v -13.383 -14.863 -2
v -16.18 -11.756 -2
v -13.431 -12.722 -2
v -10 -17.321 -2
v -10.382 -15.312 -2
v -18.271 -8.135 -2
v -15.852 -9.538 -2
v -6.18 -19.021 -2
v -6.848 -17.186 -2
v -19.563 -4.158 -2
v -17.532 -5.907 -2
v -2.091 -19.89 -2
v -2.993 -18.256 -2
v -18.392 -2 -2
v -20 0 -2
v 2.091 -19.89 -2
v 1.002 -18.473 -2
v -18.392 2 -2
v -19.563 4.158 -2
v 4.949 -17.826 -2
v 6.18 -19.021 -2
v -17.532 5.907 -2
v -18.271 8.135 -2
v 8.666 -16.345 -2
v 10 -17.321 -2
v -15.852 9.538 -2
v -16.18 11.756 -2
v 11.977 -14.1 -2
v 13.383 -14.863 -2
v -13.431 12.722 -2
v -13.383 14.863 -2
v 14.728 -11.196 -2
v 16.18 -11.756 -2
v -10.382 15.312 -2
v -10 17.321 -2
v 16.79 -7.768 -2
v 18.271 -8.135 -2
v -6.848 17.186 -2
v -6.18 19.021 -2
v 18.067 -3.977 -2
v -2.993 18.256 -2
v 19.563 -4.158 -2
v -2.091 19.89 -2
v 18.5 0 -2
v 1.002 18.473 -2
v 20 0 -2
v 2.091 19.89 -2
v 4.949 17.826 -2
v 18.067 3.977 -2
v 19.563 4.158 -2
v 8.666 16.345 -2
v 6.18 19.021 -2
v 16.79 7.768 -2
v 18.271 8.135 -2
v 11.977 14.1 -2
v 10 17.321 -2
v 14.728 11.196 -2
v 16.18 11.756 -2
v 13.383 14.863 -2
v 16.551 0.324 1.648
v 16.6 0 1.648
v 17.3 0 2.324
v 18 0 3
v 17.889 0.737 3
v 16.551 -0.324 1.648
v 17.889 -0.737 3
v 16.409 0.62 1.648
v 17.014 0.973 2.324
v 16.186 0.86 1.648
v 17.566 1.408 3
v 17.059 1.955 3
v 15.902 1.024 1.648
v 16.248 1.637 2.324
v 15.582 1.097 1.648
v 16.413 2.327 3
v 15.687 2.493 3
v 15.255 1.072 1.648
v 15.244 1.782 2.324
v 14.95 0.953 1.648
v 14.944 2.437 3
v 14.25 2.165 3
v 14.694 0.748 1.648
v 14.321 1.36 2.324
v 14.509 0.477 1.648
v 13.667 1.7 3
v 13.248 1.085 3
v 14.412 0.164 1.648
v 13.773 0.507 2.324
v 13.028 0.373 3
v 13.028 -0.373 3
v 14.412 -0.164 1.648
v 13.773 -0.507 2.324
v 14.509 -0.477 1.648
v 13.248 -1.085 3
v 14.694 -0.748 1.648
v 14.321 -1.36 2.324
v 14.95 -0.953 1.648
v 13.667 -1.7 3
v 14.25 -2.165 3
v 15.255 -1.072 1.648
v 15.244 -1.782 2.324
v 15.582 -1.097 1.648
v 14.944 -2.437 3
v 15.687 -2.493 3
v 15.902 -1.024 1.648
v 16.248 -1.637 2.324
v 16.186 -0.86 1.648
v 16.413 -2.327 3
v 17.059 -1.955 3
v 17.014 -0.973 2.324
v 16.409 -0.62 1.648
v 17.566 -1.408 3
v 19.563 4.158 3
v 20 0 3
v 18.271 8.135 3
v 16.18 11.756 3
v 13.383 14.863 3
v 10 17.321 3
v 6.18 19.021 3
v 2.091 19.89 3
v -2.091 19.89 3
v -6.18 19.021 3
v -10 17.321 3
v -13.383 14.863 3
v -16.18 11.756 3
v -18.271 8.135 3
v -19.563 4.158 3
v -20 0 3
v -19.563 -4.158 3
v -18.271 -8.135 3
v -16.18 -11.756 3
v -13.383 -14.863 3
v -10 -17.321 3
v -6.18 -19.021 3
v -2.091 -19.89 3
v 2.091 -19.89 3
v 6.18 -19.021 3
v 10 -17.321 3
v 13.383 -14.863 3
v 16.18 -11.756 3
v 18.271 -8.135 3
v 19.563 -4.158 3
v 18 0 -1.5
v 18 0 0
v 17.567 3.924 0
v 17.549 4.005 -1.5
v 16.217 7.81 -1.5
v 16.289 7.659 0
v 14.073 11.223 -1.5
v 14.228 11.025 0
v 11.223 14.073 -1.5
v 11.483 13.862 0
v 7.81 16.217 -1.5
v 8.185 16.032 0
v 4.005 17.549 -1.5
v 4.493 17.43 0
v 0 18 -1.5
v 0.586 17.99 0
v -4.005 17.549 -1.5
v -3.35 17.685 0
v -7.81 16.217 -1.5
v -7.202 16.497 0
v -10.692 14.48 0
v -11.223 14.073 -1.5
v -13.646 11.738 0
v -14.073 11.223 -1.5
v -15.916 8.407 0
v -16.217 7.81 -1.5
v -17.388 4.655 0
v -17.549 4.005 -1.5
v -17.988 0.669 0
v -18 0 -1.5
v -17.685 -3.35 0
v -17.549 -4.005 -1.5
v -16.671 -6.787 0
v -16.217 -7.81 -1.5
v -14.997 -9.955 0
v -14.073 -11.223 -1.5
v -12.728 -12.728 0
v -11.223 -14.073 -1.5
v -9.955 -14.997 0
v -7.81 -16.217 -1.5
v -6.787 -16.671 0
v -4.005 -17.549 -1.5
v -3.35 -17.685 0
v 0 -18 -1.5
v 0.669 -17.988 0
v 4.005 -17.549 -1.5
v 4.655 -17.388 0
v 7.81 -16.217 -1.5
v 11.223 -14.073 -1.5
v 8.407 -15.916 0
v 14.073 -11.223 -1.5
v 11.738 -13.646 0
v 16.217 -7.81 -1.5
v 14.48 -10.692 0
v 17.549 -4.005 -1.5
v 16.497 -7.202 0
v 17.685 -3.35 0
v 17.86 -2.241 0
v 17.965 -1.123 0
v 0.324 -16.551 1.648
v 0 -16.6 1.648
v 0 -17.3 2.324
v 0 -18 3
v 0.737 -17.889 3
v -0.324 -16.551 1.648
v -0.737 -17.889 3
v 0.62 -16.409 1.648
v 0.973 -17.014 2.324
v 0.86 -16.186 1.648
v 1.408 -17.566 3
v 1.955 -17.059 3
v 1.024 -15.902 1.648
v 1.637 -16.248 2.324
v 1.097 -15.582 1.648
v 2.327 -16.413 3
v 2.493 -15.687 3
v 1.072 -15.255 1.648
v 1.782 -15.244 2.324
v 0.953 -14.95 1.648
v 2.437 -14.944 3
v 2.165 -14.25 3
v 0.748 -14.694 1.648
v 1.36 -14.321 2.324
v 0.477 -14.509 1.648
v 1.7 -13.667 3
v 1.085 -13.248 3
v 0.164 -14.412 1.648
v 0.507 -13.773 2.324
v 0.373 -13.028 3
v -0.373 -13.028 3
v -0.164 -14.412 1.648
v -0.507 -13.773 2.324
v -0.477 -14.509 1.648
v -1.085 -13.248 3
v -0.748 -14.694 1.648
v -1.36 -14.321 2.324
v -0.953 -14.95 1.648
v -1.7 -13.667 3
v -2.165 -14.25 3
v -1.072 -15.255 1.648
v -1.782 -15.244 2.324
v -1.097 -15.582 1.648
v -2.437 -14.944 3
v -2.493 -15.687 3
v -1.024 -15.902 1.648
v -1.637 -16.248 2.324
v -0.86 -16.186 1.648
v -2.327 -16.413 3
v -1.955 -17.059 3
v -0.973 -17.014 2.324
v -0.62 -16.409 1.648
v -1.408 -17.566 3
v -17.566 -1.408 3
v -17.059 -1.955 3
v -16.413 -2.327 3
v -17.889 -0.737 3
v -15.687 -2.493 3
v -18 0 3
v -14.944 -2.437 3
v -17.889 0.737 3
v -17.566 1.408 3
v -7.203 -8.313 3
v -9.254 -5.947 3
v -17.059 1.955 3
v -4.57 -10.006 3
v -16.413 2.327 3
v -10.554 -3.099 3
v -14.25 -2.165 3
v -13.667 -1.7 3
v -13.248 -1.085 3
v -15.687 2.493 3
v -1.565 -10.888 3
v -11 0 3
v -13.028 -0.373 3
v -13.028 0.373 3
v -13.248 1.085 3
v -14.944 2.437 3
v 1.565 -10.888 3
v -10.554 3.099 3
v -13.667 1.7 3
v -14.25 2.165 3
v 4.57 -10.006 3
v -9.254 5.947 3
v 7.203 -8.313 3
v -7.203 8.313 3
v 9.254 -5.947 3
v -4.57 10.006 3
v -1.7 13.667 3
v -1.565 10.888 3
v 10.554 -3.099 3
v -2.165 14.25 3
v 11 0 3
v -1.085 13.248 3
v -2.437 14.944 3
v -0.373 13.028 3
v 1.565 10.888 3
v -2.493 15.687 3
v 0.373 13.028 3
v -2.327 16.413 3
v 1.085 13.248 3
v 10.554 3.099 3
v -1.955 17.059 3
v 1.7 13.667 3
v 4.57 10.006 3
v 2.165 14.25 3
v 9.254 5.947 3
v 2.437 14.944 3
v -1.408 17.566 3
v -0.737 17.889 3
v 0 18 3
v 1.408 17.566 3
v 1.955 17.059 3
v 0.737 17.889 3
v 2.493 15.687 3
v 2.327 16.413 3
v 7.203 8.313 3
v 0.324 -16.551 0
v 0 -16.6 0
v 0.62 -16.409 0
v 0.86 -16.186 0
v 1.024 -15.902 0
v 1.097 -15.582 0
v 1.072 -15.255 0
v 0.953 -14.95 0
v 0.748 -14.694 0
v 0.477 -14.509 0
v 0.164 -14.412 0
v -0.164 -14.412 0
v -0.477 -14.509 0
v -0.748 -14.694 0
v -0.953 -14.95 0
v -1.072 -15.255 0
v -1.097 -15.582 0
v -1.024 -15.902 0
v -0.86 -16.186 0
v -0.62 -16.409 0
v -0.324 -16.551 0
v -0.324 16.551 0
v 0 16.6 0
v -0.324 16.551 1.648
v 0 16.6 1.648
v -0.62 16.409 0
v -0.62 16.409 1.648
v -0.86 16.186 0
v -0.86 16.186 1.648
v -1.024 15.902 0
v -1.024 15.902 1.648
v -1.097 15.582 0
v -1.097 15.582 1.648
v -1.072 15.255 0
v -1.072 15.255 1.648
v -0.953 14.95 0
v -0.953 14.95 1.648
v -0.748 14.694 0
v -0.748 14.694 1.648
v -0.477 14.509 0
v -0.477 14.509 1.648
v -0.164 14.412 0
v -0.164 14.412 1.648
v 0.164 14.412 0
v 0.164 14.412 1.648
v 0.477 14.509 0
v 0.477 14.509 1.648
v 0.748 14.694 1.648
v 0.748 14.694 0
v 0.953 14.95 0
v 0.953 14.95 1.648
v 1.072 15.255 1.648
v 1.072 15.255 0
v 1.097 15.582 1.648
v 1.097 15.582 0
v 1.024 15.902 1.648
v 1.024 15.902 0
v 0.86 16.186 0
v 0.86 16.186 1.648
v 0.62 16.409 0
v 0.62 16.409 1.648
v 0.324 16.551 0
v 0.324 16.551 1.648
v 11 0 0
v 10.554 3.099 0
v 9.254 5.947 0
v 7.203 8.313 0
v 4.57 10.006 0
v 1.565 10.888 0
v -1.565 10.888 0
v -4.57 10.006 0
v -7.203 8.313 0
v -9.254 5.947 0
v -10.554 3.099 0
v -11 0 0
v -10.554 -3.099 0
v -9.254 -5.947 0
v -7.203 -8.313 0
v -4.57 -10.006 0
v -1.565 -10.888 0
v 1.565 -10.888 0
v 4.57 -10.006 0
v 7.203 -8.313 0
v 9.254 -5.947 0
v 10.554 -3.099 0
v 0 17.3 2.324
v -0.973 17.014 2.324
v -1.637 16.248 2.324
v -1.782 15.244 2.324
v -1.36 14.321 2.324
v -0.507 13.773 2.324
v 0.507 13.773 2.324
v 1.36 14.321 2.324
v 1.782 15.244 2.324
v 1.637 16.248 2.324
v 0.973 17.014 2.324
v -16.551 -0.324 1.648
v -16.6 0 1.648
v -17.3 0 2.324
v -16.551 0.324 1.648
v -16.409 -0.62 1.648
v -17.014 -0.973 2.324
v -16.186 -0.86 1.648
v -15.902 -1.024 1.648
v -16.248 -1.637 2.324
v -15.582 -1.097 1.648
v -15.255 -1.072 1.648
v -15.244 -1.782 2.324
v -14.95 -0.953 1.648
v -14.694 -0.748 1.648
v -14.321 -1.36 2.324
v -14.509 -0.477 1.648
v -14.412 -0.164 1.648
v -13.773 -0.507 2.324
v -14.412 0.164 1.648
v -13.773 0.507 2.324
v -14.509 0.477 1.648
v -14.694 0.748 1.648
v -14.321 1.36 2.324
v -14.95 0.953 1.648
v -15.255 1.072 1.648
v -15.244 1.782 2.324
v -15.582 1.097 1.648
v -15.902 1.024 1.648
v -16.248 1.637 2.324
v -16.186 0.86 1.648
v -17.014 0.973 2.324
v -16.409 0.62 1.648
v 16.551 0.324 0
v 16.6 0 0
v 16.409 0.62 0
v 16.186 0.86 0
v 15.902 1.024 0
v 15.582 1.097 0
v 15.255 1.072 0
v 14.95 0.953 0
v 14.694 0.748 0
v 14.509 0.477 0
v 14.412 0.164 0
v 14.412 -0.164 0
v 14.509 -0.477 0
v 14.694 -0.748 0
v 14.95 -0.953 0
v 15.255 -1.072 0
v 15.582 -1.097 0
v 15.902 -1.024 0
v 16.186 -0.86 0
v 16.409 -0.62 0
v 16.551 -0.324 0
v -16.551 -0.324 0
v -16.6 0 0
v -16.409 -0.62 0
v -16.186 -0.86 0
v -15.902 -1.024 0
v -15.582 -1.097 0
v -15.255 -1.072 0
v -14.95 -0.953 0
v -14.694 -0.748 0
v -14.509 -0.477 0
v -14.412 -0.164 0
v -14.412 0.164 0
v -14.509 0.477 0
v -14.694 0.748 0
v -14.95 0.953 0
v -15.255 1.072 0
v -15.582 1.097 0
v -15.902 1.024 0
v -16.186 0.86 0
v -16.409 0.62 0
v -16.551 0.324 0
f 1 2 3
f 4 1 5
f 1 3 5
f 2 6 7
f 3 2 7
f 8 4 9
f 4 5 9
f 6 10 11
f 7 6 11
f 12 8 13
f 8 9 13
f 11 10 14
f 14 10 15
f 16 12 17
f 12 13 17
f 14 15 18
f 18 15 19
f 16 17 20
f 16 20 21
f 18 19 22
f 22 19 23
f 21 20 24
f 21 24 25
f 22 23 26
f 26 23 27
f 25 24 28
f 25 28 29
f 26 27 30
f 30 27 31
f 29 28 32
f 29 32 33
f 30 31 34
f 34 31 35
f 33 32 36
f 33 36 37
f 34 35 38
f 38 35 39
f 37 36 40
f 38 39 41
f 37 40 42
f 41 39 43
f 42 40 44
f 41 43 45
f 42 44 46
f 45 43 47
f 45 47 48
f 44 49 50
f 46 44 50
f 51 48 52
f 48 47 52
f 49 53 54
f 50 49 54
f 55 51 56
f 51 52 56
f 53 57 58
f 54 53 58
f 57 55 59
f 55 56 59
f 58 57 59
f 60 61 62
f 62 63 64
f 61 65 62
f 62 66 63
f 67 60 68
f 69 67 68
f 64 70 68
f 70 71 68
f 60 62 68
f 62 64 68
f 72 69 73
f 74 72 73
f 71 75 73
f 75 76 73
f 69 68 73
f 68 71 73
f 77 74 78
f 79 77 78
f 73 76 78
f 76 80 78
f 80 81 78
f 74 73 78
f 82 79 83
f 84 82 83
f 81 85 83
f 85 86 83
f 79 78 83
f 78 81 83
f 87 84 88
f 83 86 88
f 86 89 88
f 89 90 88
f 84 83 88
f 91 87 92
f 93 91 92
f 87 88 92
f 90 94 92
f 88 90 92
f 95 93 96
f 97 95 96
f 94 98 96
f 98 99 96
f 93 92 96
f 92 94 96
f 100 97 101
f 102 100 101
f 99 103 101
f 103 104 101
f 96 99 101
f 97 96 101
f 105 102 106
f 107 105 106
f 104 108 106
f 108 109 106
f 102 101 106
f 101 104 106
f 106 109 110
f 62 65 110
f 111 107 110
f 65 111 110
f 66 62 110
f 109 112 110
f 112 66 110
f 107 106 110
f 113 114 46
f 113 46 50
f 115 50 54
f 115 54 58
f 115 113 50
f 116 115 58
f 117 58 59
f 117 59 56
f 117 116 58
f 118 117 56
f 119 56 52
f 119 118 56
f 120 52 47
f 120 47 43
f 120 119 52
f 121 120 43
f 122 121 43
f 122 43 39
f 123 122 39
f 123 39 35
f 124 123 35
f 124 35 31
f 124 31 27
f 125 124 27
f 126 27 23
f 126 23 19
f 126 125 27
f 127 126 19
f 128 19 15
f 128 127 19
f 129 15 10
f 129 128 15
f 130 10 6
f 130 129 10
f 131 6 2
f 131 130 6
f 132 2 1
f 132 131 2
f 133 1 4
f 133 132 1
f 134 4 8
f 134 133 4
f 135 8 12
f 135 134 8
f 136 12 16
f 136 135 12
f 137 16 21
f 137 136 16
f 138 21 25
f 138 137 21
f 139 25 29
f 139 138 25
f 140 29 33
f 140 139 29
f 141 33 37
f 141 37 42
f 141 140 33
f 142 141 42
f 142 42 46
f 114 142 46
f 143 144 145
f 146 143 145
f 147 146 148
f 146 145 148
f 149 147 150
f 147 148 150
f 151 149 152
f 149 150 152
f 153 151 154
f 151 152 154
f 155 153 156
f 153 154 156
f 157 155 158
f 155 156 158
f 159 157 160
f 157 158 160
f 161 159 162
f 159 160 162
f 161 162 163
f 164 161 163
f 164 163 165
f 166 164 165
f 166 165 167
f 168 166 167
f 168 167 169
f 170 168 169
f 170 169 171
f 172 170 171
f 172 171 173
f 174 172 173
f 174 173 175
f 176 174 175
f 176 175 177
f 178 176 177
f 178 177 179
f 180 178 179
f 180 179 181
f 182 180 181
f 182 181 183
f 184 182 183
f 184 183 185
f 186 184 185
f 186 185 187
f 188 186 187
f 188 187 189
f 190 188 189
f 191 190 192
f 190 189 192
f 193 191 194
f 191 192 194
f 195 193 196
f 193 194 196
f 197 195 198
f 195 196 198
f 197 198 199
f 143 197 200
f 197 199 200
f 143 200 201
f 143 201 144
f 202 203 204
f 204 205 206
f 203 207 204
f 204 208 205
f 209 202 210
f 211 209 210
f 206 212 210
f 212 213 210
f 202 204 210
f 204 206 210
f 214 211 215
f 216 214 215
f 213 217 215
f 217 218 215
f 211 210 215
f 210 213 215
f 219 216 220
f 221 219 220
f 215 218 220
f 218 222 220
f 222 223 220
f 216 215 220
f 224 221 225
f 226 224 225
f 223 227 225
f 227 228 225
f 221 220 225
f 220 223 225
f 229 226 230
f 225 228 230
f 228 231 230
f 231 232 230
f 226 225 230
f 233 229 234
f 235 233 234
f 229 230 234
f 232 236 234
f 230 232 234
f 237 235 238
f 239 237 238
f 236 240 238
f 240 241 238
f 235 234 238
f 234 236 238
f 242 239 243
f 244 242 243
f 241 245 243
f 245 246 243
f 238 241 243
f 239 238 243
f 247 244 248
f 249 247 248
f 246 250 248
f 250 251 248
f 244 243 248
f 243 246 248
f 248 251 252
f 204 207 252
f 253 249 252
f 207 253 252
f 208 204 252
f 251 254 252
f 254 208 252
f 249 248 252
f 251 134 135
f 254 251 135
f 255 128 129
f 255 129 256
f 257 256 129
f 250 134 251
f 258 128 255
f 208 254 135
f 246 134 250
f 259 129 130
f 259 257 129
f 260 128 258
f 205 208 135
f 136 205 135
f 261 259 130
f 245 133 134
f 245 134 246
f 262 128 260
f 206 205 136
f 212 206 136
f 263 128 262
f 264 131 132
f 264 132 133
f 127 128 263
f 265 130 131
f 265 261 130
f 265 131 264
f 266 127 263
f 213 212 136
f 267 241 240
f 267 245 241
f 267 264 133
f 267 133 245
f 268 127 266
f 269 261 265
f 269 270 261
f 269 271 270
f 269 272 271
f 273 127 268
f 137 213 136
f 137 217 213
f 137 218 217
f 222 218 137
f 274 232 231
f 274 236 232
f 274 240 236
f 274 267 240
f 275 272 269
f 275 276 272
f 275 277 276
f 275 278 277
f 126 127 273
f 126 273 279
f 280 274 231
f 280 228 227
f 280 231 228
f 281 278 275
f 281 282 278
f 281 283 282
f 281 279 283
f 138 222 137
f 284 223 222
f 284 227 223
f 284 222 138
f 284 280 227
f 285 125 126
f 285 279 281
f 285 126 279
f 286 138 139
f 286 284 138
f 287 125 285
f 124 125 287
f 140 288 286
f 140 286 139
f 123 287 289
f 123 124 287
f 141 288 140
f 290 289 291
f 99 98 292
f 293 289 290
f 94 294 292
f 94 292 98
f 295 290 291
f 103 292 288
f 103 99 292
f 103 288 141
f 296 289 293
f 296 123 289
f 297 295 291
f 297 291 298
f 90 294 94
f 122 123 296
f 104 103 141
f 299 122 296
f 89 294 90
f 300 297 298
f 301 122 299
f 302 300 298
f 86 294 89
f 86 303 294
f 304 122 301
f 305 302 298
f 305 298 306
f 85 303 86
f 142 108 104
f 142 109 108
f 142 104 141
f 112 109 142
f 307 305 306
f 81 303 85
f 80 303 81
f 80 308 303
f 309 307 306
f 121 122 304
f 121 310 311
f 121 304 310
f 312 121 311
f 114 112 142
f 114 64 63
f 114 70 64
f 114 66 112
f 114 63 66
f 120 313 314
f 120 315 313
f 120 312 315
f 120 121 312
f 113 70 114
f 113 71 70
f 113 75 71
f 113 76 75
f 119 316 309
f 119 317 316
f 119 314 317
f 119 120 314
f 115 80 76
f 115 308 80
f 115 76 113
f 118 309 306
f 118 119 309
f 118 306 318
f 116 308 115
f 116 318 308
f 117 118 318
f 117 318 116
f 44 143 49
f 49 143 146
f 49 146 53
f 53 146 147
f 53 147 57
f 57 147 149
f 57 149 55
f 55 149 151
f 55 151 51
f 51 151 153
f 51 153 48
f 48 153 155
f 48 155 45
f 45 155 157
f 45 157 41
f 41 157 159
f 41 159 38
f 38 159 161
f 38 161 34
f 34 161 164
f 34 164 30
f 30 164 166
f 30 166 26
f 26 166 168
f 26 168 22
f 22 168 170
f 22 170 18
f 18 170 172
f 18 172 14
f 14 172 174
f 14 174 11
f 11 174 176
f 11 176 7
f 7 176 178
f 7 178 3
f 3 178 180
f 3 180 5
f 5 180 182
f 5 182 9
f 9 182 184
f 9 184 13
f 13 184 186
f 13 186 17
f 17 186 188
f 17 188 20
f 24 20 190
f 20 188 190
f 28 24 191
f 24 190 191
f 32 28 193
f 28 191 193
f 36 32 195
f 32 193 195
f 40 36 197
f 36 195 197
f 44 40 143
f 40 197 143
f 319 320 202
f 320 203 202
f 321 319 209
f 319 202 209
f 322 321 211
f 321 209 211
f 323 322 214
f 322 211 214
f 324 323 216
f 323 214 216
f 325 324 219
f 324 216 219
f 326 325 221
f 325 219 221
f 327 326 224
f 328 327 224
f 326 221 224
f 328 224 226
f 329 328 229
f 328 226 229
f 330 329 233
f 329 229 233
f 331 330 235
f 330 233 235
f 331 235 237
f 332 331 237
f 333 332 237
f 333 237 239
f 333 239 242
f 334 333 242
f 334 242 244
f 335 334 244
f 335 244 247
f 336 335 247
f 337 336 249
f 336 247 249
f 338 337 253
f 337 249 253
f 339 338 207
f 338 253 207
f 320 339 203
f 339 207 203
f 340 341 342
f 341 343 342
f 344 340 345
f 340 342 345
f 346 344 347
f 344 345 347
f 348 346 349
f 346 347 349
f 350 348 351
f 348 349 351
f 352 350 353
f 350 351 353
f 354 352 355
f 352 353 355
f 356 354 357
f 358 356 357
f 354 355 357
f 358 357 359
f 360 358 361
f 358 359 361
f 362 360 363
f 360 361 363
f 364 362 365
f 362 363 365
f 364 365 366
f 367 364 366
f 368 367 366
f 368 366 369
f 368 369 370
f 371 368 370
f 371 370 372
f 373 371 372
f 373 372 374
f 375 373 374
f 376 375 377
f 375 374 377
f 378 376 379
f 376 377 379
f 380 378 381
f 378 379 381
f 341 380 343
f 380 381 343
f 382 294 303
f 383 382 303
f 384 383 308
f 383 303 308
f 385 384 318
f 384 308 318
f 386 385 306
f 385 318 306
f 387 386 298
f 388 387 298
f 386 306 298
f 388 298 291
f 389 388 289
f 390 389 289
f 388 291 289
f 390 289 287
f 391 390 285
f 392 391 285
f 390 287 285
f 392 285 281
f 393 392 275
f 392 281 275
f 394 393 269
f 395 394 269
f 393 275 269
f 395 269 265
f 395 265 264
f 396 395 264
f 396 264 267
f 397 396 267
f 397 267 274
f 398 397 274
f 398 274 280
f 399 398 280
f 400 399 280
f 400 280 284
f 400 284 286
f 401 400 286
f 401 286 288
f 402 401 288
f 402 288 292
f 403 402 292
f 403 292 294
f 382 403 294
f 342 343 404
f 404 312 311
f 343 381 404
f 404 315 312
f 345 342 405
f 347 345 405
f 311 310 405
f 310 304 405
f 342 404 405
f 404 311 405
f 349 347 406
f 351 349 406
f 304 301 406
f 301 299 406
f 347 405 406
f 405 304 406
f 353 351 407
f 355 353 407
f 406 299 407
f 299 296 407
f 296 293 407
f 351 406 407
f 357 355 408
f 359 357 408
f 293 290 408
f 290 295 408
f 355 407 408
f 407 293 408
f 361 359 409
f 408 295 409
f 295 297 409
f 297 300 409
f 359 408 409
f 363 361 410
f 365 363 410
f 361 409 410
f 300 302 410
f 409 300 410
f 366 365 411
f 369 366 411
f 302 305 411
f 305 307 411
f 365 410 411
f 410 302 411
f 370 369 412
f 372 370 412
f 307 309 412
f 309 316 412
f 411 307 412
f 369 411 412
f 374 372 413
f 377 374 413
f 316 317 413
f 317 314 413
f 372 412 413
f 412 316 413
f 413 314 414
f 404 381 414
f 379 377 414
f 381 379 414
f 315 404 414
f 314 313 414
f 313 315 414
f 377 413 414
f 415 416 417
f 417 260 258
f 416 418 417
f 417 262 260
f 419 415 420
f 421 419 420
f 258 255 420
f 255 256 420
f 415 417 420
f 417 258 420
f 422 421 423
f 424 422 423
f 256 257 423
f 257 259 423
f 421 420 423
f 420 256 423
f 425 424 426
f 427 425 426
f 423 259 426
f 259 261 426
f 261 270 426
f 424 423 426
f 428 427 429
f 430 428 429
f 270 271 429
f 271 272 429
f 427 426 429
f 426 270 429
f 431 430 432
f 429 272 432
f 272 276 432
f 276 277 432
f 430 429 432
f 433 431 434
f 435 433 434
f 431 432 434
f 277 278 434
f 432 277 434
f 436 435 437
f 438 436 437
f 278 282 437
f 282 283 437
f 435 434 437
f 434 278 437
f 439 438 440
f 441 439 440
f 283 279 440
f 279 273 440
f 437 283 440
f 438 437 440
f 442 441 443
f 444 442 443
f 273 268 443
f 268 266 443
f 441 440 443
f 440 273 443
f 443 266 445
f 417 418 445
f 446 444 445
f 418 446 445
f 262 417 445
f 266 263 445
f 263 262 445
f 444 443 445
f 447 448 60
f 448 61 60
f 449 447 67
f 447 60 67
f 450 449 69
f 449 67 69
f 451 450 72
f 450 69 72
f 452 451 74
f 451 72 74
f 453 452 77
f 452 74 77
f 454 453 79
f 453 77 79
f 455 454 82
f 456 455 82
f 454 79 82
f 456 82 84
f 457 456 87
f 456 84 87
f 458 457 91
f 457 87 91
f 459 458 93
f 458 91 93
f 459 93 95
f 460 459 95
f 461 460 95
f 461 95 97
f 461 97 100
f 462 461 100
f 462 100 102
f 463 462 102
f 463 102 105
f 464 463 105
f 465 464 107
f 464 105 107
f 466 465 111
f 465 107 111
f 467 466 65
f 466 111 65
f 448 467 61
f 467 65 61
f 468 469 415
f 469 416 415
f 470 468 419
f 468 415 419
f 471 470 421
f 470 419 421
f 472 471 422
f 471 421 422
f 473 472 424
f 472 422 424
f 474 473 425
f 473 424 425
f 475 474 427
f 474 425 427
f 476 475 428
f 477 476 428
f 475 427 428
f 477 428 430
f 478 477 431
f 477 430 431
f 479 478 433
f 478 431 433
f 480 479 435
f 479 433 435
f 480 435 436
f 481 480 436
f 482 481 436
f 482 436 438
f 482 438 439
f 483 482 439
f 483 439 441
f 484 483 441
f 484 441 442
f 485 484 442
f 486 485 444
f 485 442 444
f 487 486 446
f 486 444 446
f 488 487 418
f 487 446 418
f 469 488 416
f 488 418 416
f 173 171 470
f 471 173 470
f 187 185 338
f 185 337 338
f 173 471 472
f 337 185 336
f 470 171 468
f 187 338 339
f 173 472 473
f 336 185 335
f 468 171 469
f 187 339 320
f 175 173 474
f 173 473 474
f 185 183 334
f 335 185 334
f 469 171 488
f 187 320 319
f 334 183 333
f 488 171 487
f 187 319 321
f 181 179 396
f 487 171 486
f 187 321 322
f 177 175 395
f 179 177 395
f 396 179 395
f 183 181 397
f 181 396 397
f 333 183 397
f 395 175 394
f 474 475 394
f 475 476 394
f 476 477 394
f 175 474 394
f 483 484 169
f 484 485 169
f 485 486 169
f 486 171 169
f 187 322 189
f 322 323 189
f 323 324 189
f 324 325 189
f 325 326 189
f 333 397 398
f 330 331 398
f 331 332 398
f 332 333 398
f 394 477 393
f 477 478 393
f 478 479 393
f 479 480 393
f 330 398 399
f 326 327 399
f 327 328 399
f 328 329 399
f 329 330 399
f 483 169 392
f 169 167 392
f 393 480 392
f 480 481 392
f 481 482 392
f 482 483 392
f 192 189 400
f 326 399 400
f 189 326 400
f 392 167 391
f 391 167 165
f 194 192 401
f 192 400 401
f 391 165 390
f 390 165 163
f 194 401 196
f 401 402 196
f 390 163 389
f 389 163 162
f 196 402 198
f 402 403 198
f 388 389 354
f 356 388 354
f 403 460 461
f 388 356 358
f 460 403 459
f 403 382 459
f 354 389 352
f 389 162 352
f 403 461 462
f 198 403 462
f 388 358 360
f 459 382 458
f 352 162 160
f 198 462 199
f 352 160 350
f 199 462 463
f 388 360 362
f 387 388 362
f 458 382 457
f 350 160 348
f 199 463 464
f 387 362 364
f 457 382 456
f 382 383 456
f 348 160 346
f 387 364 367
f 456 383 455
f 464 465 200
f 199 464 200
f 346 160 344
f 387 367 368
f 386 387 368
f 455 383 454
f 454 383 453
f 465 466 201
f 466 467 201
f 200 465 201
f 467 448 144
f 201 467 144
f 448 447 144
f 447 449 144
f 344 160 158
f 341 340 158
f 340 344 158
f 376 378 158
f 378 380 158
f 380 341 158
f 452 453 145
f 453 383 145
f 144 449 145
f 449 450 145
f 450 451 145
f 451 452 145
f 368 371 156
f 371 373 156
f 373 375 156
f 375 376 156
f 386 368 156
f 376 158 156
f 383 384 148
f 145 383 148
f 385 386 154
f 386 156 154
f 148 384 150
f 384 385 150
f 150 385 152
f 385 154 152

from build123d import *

# Parameters (mm, degrees)
EXTRUDE_1_DEPTH          = 3
SKETCH_2_R               = 11
CUT_EXTRUDE_1_DEPTH      = 4
SKETCH_5_R               = 20
SKETCH_5_R_2             = 18
EXTRUDE_2_DEPTH          = 5
PATTERN_CIRCULAR_1_COUNT = 4
CHAMFER_1_SIZE           = 0.5


with BuildPart() as part:
    # Эскиз1 → Бобышка-Вытянуть1 (new body)
    with BuildSketch(Plane.XY):
        with BuildLine():
            ThreePointArc((-17.685483871, -3.350173167), (-12.727922061, -12.727922061), (-3.350173167, -17.685483871))
            ThreePointArc((-3.350173167, -17.685483871), (10.136595409, -14.874455738), (17.685483871, -3.350173167))
            ThreePointArc((17.685483871, -3.350173167), (12.727922061, 12.727922061), (-3.350173167, 17.685483871))
            ThreePointArc((-3.350173167, 17.685483871), (-14.874455738, 10.136595409), (-17.685483871, -3.350173167))
        make_face()
    extrude(amount=EXTRUDE_1_DEPTH)

    # Эскиз2 → Вырез-Вытянуть1 (cut, through all)
    with BuildSketch(Plane.XY.offset(3)):
        Circle(SKETCH_2_R)
    extrude(amount=-CUT_EXTRUDE_1_DEPTH, mode=Mode.SUBTRACT)

    # Эскиз5 → Бобышка-Вытянуть2 (add)
    with BuildSketch(Plane.XY.offset(3)):
        Circle(SKETCH_5_R)
        Circle(SKETCH_5_R_2, mode=Mode.SUBTRACT)
    extrude(amount=-EXTRUDE_2_DEPTH)

    # Эскиз6 → Вырез-Повернуть1 (revolve, cut)
    with BuildSketch(Plane(origin=(0, 0, 0), x_dir=(1, 0, 0), z_dir=(0, 1, 0))):
        Polygon((-16.6, -1.648035715), (-18, -3), (-15.5, -3), (-15.5, -1.648035715), (-15.5, 2), (-16.6, 2), align=None)
    cut_revolve_1 = revolve(axis=Axis((-15.5, 0, -24.0808518), (0, 0, 1)), mode=Mode.SUBTRACT)

    # Круговой массив1: Вырез-Повернуть1 ×4 about axis
    pattern_circular_1_axis = Axis((0, 0, 0), (0, 0, 1))
    for i in range(1, PATTERN_CIRCULAR_1_COUNT):
        add(cut_revolve_1.rotate(pattern_circular_1_axis, i * 360 / PATTERN_CIRCULAR_1_COUNT), mode=Mode.SUBTRACT)

    # Фаска1
    chamfer_1_edges = [part.edges().sort_by_distance(p)[0] for p in [
        (-18, 0, -2),
    ]]
    chamfer(chamfer_1_edges, length=CHAMFER_1_SIZE)


solid = part.part
